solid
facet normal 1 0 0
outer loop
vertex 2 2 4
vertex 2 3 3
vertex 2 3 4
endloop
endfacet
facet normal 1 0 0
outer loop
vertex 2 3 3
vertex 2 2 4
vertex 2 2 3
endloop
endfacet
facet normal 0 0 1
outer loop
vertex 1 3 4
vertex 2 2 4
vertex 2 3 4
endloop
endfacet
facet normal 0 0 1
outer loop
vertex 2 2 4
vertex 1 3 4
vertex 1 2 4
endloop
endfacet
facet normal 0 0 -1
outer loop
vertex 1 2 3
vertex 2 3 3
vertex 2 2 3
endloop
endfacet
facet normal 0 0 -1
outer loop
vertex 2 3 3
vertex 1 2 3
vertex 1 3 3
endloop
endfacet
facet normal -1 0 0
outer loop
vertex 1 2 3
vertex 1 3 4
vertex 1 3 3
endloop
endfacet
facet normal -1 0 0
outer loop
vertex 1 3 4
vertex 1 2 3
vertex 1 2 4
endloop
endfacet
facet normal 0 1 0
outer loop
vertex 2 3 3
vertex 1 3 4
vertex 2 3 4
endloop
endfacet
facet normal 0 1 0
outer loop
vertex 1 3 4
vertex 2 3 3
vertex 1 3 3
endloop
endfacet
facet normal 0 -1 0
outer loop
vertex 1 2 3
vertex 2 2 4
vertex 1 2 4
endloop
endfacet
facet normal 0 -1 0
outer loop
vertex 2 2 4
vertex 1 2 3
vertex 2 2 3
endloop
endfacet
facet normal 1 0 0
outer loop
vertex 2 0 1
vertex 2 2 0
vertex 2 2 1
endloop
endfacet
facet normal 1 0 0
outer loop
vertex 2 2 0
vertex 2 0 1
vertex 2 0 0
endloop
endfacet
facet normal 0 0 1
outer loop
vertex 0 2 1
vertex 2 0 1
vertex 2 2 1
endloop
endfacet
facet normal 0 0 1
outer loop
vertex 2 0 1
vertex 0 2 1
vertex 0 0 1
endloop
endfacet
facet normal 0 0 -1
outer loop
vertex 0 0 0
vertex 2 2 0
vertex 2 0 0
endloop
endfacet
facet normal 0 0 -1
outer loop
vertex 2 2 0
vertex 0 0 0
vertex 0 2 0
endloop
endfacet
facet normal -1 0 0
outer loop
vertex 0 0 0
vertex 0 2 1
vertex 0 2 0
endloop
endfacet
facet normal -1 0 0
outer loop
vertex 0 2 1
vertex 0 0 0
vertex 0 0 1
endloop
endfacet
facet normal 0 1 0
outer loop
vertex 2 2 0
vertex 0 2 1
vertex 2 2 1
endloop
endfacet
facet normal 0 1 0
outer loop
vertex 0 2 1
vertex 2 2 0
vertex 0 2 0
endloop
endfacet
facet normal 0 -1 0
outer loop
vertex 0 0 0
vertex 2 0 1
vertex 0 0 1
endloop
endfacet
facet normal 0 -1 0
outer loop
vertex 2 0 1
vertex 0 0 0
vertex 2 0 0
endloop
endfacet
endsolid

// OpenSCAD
multmatrix([[1, 0, 0, 1], [0, 1, 0, 2], [0, 0, 1, 3]]) cube();
multmatrix([[1, 0, 0, 1], [0, 1, 0, 2], [0, 0, 1, 3], [0, 0, 0, 1]]) cube();
multmatrix([[2, 0], [0, 2]]) cube();
multmatrix([[1, 0.5, 0, 0], [0, 1, 0, 0], [0, 0, 1, 0]]) cube();
multmatrix([[0 * -1, 0, 0, 0], [0, 1, 0, 0], [0, 0, 1, 0]]) cube();
multmatrix() cube();
